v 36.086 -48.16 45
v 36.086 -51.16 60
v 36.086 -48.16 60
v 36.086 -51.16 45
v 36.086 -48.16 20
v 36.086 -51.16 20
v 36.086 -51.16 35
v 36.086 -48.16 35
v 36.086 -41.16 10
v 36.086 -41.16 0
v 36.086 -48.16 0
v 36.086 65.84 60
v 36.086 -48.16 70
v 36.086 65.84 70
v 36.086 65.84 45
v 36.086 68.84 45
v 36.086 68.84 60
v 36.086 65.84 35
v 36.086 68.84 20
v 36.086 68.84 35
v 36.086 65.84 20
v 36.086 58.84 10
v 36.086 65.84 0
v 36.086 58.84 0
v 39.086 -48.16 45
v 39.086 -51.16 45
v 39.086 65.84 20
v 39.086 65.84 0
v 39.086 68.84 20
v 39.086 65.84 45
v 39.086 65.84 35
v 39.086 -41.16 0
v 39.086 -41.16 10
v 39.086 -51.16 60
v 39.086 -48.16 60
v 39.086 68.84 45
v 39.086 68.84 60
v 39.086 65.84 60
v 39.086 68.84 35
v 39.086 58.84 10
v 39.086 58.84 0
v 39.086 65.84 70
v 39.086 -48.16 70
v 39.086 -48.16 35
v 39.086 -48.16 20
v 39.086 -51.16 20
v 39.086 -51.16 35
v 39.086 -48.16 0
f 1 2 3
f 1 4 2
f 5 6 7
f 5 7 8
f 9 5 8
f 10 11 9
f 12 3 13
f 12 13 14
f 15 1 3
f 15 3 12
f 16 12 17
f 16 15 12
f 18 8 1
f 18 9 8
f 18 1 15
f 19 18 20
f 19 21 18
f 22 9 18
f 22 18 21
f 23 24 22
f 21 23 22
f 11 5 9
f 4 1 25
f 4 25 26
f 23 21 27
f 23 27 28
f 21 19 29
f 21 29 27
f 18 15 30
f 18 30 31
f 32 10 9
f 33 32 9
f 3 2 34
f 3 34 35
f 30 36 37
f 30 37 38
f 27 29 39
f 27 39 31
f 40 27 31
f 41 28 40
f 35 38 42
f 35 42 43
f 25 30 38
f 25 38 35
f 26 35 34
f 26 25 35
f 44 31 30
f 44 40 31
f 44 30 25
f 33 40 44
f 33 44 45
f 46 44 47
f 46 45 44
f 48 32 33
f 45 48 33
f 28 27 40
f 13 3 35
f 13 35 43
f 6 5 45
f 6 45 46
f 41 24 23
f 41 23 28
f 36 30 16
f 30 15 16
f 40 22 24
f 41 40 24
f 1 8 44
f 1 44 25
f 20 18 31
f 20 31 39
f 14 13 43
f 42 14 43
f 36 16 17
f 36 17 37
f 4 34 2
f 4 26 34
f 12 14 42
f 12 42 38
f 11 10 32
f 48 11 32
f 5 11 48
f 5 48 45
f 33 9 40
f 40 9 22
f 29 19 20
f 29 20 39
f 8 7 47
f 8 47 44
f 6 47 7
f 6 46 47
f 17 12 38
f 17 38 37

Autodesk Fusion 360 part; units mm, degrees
sketch "Sketch1" plane through (0, 0, 0) normal (0, 0, 1) x (1, 0, 0)
  line L0 (36.0863, 68.8405) -> (39.0863, 68.8405)
  line L1 (39.0863, 68.8405) -> (39.0863, -51.1595)
  line L2 (39.0863, -51.1595) -> (36.0863, -51.1595)
  line L3 (36.0863, -51.1595) -> (36.0863, 68.8405)
  dimension "d1" = 3
  dimension "d2" = 120
extrude "Extrude1" add sketch "Sketch1" along normal blind 70
sketch "Sketch2" plane through (36.0863, 0, 0) normal (-1, 0, 0) x (0, -1, 0)
  line L0 (-68.8405, 0) -> (51.1595, 0)
  line L1 (51.1595, 0) -> (51.1595, 70)
  line L2 (51.1595, 70) -> (-68.8405, 70)
  line L3 (-68.8405, 70) -> (-68.8405, 0)
  line L4 (-58.8405, 0) -> (41.1595, 0)
  line L5 (41.1595, 0) -> (41.1595, 10)
  line L6 (41.1595, 10) -> (-58.8405, 10)
  line L7 (-58.8405, 10) -> (-58.8405, 0)
  dimension "d5" = 10
  dimension "d6" = 100
  dimension "d7" = 10
extrude "Extrude2" cut sketch "Sketch2" against normal blind 15 contours L0 L4 L5 L6 L7
sketch "Sketch3" plane through (36.0863, 0, 0) normal (-1, 0, 0) x (0, -1, 0)
  line L0 (41.1595, 10) -> (41.1595, 0)
  line L1 (41.1595, 0) -> (51.1595, 0)
  line L2 (51.1595, 0) -> (51.1595, 70)
  line L3 (51.1595, 70) -> (-68.8405, 70)
  line L4 (-68.8405, 70) -> (-68.8405, 0)
  line L5 (-68.8405, 0) -> (-58.8405, 0)
  line L6 (-58.8405, 0) -> (-58.8405, 10)
  line L7 (-58.8405, 10) -> (41.1595, 10)
  line L8 (-81.9379, 60) -> (81.0278, 60) construction
  line L9 (-84.1729, 45) -> (76.1854, 45) construction
  line L10 (-82.6829, 35) -> (77.4892, 35) construction
  line L11 (-85.6629, 20) -> (78.0479, 20) construction
  line L12 (-65.8405, 82.86) -> (-65.8405, -11.3972) construction
  line L13 (48.1595, 79.5603) -> (48.1595, -14.1231) construction
  line L14 (-65.8405, 60) -> (-65.8405, 45) construction
  line L15 (-65.8405, 45) -> (-68.8405, 45) construction
  line L16 (-68.8405, 35) -> (-65.8405, 35) construction
  line L17 (-65.8405, 35) -> (-65.8405, 20) construction
  line L18 (-65.8405, 20) -> (-68.8405, 20) construction
  line L19 (51.1595, 20) -> (48.1595, 20) construction
  line L20 (48.1595, 20) -> (48.1595, 35) construction
  line L21 (48.1595, 35) -> (51.1595, 35) construction
  line L22 (51.1595, 35) -> (51.1595, 20) construction
  line L23 (51.1595, 45) -> (48.1595, 45) construction
  line L24 (48.1595, 60) -> (51.1595, 60) construction
  line L25 (51.1595, 60) -> (51.1595, 45) construction
  line L26 (-65.8405, 45) -> (-68.8405, 45)
  line L27 (-65.8405, 60) -> (-68.8405, 60)
  line L28 (-68.8405, 60) -> (-68.8405, 70)
  line L29 (-68.8405, 70) -> (-65.8405, 70)
  line L30 (-65.8405, 70) -> (-65.8405, 60)
  line L31 (-65.8405, 35) -> (-68.8405, 35)
  line L32 (-68.8405, 35) -> (-68.8405, 45)
  line L33 (-68.8405, 45) -> (-65.8405, 45)
  line L34 (-65.8405, 45) -> (-65.8405, 35)
  line L35 (-65.8405, 0) -> (-68.8405, 0)
  line L36 (-68.8405, 0) -> (-68.8405, 20)
  line L37 (-68.8405, 20) -> (-65.8405, 20)
  line L38 (-65.8405, 20) -> (-65.8405, 0)
  line L39 (51.1595, 0) -> (48.1595, 0)
  line L40 (48.1595, 0) -> (48.1595, 20)
  line L41 (48.1595, 20) -> (51.1595, 20)
  line L42 (51.1595, 20) -> (51.1595, 0)
  line L43 (51.1595, 35) -> (48.1595, 35)
  line L44 (48.1595, 35) -> (48.1595, 45)
  line L45 (48.1595, 45) -> (51.1595, 45)
  line L46 (51.1595, 45) -> (51.1595, 35)
  line L47 (51.1595, 60) -> (48.1595, 60)
  line L48 (48.1595, 60) -> (48.1595, 70)
  line L49 (48.1595, 70) -> (51.1595, 70)
  line L50 (51.1595, 70) -> (51.1595, 60)
  dimension "d10" = 10
  dimension "d11" = 15
  dimension "d12" = 10
  dimension "d13" = 15
  dimension "d14" = 3
  dimension "d15" = 3
extrude "Extrude3" cut sketch "Sketch3" against normal blind 30 contours L1 L2 L39 L40 L41 L42 | L4 L5 L35 L36 L37 L38 | L2 L43 L44 L45 L46 | L4 L26 L31 L32 L33 L34 | L2 L3 L47 L48 L49 L50 | L3 L4 L27 L28 L29 L30
